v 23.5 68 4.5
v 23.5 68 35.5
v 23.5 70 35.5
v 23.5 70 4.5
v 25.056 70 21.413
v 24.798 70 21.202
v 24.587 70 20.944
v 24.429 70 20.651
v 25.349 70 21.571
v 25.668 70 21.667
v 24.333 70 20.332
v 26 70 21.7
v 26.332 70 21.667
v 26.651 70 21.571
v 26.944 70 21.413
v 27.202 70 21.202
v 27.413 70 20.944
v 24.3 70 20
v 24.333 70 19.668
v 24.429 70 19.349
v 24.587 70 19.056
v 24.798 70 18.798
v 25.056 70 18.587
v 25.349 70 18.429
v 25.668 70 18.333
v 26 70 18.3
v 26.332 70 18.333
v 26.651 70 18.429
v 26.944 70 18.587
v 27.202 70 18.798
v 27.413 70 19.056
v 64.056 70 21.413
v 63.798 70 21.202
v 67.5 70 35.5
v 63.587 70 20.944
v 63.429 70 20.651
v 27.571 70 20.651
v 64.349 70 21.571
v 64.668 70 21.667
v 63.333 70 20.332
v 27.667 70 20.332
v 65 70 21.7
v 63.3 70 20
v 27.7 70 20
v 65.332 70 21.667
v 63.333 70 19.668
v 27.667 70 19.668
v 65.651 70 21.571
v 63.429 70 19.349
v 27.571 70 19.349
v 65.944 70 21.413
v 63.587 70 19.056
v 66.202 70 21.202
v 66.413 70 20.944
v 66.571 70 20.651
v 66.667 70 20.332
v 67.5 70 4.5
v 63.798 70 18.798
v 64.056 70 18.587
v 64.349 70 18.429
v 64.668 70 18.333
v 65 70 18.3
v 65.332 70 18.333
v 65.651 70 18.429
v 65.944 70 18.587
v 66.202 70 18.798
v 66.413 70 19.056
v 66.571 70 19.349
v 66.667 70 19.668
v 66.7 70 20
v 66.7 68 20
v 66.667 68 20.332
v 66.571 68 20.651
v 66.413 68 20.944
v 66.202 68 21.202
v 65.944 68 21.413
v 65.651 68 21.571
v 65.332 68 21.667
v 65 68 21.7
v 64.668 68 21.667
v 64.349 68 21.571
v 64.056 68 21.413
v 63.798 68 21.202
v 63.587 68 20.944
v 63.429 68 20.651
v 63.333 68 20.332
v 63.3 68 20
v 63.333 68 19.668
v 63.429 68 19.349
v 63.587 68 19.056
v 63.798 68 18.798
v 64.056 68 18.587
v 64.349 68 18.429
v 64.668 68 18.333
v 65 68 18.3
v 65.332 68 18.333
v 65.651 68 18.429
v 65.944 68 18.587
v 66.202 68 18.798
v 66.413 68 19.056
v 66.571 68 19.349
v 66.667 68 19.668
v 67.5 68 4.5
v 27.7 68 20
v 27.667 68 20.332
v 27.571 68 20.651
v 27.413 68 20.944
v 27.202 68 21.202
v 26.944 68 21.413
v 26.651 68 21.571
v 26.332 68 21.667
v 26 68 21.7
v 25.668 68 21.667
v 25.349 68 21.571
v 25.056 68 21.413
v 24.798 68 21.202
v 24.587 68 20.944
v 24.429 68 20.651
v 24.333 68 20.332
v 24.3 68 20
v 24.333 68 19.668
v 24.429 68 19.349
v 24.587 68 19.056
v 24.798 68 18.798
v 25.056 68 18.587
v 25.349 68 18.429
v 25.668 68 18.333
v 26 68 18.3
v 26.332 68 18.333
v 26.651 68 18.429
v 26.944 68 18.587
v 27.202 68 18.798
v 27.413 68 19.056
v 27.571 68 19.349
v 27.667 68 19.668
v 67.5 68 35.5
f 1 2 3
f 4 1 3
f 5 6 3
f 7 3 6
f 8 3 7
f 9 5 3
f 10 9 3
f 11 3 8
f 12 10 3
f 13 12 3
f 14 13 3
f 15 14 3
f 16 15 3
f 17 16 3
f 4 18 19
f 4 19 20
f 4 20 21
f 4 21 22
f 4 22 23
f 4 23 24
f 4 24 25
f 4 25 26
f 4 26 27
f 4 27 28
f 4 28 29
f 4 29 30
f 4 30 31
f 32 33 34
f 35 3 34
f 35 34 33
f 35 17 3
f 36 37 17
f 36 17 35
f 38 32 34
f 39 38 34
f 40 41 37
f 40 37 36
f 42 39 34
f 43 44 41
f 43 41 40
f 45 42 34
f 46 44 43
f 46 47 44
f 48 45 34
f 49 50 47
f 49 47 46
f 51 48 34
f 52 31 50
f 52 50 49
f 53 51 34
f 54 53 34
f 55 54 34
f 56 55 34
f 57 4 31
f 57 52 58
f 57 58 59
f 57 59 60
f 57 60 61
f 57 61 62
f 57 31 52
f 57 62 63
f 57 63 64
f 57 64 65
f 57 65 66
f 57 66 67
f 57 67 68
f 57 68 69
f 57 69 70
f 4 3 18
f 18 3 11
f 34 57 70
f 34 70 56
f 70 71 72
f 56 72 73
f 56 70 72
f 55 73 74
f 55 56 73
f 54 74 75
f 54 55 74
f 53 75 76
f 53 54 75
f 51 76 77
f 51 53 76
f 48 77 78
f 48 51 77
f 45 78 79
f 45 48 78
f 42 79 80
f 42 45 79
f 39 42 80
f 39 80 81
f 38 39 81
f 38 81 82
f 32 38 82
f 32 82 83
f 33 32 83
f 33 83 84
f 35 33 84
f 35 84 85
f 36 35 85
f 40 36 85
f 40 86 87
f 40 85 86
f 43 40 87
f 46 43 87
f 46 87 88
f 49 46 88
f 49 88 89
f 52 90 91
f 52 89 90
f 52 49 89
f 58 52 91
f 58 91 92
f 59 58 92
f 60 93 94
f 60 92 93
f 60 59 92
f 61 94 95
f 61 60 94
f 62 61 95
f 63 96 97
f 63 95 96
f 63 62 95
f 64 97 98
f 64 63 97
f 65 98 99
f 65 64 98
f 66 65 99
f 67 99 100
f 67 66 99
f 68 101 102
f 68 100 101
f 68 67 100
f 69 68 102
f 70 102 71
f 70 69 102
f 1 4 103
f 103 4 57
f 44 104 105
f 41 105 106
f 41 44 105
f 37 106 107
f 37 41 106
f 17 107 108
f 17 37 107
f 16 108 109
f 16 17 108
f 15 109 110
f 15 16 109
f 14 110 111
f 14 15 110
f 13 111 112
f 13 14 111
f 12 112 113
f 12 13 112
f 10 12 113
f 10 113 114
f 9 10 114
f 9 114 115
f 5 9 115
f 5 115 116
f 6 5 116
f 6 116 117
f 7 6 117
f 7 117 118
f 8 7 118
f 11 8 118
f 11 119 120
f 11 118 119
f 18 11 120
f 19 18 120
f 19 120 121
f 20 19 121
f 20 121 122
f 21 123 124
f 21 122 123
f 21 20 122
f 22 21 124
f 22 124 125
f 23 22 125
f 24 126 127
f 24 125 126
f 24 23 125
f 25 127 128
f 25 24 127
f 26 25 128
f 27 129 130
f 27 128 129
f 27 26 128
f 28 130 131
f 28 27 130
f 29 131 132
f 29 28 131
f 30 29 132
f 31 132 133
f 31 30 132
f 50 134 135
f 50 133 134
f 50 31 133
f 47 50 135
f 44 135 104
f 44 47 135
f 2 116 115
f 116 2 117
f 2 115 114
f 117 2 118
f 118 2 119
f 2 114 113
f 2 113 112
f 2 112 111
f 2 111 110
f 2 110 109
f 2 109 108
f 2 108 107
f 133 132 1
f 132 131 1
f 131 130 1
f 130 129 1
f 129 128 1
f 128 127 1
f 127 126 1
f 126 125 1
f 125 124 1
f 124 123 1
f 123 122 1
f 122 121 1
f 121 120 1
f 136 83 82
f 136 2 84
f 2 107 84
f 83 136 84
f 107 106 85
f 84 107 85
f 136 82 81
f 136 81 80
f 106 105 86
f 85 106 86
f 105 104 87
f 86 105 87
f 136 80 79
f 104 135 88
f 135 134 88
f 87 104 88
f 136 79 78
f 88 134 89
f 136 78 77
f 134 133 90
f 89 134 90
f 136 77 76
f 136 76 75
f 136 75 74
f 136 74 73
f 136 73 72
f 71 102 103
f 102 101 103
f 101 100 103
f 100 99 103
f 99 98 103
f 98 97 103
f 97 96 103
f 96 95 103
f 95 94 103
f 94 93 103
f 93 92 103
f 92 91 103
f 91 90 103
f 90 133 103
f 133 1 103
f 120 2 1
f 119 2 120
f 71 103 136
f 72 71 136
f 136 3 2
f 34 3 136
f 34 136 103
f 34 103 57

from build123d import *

# Parameters (mm, degrees)
CYLINDER043_R          = 1.7
CYLINDER043_DEPTH      = 10
CYLINDER043_ROLL_ANGLE = 90
CYLINDER044_R          = 1.7
CYLINDER044_DEPTH      = 10
CYLINDER044_ROLL_ANGLE = 90
BOX080_W               = 44
BOX080_H               = 2
BOX080_DEPTH           = 31


with BuildPart() as cylinder075:
    # Cylinder043 → Cylinder043 (new body)
    with BuildSketch(Plane.XY):
        Circle(CYLINDER043_R)
    extrude(amount=CYLINDER043_DEPTH)


with BuildPart() as cylinder075_1:
    # Cylinder043 roll: moved
    add(cylinder075.part.rotate(Axis((0, 0, 0), (1, 0, 0)), CYLINDER043_ROLL_ANGLE))


with BuildPart() as cylinder075_2:
    # Cylinder043 placement: moved
    add(cylinder075_1.part.moved(Location((26, 70, 20))))


with BuildPart() as cylinder076:
    # Cylinder044 → Cylinder044 (new body)
    with BuildSketch(Plane.XY):
        Circle(CYLINDER044_R)
    extrude(amount=CYLINDER044_DEPTH)


with BuildPart() as cylinder076_1:
    # Cylinder044 roll: moved
    add(cylinder076.part.rotate(Axis((0, 0, 0), (1, 0, 0)), CYLINDER044_ROLL_ANGLE))


with BuildPart() as cylinder076_2:
    # Cylinder044 placement: moved
    add(cylinder076_1.part.moved(Location((65, 70, 20))))


with BuildPart() as tapa_pilas:
    # Box080 → Box080 (new body)
    with BuildSketch(Plane(origin=(23.5, 68, 4.5), x_dir=(1, 0, 0), z_dir=(0, 0, 1))):
        with Locations((22, 1)):
            Rectangle(BOX080_W, BOX080_H)
    extrude(amount=BOX080_DEPTH)

    # Cut090: cut Cylinder076
    add(cylinder076_2.part, mode=Mode.SUBTRACT)

    # Cut091: cut Cylinder075
    add(cylinder075_2.part, mode=Mode.SUBTRACT)


solid = tapa_pilas.part
